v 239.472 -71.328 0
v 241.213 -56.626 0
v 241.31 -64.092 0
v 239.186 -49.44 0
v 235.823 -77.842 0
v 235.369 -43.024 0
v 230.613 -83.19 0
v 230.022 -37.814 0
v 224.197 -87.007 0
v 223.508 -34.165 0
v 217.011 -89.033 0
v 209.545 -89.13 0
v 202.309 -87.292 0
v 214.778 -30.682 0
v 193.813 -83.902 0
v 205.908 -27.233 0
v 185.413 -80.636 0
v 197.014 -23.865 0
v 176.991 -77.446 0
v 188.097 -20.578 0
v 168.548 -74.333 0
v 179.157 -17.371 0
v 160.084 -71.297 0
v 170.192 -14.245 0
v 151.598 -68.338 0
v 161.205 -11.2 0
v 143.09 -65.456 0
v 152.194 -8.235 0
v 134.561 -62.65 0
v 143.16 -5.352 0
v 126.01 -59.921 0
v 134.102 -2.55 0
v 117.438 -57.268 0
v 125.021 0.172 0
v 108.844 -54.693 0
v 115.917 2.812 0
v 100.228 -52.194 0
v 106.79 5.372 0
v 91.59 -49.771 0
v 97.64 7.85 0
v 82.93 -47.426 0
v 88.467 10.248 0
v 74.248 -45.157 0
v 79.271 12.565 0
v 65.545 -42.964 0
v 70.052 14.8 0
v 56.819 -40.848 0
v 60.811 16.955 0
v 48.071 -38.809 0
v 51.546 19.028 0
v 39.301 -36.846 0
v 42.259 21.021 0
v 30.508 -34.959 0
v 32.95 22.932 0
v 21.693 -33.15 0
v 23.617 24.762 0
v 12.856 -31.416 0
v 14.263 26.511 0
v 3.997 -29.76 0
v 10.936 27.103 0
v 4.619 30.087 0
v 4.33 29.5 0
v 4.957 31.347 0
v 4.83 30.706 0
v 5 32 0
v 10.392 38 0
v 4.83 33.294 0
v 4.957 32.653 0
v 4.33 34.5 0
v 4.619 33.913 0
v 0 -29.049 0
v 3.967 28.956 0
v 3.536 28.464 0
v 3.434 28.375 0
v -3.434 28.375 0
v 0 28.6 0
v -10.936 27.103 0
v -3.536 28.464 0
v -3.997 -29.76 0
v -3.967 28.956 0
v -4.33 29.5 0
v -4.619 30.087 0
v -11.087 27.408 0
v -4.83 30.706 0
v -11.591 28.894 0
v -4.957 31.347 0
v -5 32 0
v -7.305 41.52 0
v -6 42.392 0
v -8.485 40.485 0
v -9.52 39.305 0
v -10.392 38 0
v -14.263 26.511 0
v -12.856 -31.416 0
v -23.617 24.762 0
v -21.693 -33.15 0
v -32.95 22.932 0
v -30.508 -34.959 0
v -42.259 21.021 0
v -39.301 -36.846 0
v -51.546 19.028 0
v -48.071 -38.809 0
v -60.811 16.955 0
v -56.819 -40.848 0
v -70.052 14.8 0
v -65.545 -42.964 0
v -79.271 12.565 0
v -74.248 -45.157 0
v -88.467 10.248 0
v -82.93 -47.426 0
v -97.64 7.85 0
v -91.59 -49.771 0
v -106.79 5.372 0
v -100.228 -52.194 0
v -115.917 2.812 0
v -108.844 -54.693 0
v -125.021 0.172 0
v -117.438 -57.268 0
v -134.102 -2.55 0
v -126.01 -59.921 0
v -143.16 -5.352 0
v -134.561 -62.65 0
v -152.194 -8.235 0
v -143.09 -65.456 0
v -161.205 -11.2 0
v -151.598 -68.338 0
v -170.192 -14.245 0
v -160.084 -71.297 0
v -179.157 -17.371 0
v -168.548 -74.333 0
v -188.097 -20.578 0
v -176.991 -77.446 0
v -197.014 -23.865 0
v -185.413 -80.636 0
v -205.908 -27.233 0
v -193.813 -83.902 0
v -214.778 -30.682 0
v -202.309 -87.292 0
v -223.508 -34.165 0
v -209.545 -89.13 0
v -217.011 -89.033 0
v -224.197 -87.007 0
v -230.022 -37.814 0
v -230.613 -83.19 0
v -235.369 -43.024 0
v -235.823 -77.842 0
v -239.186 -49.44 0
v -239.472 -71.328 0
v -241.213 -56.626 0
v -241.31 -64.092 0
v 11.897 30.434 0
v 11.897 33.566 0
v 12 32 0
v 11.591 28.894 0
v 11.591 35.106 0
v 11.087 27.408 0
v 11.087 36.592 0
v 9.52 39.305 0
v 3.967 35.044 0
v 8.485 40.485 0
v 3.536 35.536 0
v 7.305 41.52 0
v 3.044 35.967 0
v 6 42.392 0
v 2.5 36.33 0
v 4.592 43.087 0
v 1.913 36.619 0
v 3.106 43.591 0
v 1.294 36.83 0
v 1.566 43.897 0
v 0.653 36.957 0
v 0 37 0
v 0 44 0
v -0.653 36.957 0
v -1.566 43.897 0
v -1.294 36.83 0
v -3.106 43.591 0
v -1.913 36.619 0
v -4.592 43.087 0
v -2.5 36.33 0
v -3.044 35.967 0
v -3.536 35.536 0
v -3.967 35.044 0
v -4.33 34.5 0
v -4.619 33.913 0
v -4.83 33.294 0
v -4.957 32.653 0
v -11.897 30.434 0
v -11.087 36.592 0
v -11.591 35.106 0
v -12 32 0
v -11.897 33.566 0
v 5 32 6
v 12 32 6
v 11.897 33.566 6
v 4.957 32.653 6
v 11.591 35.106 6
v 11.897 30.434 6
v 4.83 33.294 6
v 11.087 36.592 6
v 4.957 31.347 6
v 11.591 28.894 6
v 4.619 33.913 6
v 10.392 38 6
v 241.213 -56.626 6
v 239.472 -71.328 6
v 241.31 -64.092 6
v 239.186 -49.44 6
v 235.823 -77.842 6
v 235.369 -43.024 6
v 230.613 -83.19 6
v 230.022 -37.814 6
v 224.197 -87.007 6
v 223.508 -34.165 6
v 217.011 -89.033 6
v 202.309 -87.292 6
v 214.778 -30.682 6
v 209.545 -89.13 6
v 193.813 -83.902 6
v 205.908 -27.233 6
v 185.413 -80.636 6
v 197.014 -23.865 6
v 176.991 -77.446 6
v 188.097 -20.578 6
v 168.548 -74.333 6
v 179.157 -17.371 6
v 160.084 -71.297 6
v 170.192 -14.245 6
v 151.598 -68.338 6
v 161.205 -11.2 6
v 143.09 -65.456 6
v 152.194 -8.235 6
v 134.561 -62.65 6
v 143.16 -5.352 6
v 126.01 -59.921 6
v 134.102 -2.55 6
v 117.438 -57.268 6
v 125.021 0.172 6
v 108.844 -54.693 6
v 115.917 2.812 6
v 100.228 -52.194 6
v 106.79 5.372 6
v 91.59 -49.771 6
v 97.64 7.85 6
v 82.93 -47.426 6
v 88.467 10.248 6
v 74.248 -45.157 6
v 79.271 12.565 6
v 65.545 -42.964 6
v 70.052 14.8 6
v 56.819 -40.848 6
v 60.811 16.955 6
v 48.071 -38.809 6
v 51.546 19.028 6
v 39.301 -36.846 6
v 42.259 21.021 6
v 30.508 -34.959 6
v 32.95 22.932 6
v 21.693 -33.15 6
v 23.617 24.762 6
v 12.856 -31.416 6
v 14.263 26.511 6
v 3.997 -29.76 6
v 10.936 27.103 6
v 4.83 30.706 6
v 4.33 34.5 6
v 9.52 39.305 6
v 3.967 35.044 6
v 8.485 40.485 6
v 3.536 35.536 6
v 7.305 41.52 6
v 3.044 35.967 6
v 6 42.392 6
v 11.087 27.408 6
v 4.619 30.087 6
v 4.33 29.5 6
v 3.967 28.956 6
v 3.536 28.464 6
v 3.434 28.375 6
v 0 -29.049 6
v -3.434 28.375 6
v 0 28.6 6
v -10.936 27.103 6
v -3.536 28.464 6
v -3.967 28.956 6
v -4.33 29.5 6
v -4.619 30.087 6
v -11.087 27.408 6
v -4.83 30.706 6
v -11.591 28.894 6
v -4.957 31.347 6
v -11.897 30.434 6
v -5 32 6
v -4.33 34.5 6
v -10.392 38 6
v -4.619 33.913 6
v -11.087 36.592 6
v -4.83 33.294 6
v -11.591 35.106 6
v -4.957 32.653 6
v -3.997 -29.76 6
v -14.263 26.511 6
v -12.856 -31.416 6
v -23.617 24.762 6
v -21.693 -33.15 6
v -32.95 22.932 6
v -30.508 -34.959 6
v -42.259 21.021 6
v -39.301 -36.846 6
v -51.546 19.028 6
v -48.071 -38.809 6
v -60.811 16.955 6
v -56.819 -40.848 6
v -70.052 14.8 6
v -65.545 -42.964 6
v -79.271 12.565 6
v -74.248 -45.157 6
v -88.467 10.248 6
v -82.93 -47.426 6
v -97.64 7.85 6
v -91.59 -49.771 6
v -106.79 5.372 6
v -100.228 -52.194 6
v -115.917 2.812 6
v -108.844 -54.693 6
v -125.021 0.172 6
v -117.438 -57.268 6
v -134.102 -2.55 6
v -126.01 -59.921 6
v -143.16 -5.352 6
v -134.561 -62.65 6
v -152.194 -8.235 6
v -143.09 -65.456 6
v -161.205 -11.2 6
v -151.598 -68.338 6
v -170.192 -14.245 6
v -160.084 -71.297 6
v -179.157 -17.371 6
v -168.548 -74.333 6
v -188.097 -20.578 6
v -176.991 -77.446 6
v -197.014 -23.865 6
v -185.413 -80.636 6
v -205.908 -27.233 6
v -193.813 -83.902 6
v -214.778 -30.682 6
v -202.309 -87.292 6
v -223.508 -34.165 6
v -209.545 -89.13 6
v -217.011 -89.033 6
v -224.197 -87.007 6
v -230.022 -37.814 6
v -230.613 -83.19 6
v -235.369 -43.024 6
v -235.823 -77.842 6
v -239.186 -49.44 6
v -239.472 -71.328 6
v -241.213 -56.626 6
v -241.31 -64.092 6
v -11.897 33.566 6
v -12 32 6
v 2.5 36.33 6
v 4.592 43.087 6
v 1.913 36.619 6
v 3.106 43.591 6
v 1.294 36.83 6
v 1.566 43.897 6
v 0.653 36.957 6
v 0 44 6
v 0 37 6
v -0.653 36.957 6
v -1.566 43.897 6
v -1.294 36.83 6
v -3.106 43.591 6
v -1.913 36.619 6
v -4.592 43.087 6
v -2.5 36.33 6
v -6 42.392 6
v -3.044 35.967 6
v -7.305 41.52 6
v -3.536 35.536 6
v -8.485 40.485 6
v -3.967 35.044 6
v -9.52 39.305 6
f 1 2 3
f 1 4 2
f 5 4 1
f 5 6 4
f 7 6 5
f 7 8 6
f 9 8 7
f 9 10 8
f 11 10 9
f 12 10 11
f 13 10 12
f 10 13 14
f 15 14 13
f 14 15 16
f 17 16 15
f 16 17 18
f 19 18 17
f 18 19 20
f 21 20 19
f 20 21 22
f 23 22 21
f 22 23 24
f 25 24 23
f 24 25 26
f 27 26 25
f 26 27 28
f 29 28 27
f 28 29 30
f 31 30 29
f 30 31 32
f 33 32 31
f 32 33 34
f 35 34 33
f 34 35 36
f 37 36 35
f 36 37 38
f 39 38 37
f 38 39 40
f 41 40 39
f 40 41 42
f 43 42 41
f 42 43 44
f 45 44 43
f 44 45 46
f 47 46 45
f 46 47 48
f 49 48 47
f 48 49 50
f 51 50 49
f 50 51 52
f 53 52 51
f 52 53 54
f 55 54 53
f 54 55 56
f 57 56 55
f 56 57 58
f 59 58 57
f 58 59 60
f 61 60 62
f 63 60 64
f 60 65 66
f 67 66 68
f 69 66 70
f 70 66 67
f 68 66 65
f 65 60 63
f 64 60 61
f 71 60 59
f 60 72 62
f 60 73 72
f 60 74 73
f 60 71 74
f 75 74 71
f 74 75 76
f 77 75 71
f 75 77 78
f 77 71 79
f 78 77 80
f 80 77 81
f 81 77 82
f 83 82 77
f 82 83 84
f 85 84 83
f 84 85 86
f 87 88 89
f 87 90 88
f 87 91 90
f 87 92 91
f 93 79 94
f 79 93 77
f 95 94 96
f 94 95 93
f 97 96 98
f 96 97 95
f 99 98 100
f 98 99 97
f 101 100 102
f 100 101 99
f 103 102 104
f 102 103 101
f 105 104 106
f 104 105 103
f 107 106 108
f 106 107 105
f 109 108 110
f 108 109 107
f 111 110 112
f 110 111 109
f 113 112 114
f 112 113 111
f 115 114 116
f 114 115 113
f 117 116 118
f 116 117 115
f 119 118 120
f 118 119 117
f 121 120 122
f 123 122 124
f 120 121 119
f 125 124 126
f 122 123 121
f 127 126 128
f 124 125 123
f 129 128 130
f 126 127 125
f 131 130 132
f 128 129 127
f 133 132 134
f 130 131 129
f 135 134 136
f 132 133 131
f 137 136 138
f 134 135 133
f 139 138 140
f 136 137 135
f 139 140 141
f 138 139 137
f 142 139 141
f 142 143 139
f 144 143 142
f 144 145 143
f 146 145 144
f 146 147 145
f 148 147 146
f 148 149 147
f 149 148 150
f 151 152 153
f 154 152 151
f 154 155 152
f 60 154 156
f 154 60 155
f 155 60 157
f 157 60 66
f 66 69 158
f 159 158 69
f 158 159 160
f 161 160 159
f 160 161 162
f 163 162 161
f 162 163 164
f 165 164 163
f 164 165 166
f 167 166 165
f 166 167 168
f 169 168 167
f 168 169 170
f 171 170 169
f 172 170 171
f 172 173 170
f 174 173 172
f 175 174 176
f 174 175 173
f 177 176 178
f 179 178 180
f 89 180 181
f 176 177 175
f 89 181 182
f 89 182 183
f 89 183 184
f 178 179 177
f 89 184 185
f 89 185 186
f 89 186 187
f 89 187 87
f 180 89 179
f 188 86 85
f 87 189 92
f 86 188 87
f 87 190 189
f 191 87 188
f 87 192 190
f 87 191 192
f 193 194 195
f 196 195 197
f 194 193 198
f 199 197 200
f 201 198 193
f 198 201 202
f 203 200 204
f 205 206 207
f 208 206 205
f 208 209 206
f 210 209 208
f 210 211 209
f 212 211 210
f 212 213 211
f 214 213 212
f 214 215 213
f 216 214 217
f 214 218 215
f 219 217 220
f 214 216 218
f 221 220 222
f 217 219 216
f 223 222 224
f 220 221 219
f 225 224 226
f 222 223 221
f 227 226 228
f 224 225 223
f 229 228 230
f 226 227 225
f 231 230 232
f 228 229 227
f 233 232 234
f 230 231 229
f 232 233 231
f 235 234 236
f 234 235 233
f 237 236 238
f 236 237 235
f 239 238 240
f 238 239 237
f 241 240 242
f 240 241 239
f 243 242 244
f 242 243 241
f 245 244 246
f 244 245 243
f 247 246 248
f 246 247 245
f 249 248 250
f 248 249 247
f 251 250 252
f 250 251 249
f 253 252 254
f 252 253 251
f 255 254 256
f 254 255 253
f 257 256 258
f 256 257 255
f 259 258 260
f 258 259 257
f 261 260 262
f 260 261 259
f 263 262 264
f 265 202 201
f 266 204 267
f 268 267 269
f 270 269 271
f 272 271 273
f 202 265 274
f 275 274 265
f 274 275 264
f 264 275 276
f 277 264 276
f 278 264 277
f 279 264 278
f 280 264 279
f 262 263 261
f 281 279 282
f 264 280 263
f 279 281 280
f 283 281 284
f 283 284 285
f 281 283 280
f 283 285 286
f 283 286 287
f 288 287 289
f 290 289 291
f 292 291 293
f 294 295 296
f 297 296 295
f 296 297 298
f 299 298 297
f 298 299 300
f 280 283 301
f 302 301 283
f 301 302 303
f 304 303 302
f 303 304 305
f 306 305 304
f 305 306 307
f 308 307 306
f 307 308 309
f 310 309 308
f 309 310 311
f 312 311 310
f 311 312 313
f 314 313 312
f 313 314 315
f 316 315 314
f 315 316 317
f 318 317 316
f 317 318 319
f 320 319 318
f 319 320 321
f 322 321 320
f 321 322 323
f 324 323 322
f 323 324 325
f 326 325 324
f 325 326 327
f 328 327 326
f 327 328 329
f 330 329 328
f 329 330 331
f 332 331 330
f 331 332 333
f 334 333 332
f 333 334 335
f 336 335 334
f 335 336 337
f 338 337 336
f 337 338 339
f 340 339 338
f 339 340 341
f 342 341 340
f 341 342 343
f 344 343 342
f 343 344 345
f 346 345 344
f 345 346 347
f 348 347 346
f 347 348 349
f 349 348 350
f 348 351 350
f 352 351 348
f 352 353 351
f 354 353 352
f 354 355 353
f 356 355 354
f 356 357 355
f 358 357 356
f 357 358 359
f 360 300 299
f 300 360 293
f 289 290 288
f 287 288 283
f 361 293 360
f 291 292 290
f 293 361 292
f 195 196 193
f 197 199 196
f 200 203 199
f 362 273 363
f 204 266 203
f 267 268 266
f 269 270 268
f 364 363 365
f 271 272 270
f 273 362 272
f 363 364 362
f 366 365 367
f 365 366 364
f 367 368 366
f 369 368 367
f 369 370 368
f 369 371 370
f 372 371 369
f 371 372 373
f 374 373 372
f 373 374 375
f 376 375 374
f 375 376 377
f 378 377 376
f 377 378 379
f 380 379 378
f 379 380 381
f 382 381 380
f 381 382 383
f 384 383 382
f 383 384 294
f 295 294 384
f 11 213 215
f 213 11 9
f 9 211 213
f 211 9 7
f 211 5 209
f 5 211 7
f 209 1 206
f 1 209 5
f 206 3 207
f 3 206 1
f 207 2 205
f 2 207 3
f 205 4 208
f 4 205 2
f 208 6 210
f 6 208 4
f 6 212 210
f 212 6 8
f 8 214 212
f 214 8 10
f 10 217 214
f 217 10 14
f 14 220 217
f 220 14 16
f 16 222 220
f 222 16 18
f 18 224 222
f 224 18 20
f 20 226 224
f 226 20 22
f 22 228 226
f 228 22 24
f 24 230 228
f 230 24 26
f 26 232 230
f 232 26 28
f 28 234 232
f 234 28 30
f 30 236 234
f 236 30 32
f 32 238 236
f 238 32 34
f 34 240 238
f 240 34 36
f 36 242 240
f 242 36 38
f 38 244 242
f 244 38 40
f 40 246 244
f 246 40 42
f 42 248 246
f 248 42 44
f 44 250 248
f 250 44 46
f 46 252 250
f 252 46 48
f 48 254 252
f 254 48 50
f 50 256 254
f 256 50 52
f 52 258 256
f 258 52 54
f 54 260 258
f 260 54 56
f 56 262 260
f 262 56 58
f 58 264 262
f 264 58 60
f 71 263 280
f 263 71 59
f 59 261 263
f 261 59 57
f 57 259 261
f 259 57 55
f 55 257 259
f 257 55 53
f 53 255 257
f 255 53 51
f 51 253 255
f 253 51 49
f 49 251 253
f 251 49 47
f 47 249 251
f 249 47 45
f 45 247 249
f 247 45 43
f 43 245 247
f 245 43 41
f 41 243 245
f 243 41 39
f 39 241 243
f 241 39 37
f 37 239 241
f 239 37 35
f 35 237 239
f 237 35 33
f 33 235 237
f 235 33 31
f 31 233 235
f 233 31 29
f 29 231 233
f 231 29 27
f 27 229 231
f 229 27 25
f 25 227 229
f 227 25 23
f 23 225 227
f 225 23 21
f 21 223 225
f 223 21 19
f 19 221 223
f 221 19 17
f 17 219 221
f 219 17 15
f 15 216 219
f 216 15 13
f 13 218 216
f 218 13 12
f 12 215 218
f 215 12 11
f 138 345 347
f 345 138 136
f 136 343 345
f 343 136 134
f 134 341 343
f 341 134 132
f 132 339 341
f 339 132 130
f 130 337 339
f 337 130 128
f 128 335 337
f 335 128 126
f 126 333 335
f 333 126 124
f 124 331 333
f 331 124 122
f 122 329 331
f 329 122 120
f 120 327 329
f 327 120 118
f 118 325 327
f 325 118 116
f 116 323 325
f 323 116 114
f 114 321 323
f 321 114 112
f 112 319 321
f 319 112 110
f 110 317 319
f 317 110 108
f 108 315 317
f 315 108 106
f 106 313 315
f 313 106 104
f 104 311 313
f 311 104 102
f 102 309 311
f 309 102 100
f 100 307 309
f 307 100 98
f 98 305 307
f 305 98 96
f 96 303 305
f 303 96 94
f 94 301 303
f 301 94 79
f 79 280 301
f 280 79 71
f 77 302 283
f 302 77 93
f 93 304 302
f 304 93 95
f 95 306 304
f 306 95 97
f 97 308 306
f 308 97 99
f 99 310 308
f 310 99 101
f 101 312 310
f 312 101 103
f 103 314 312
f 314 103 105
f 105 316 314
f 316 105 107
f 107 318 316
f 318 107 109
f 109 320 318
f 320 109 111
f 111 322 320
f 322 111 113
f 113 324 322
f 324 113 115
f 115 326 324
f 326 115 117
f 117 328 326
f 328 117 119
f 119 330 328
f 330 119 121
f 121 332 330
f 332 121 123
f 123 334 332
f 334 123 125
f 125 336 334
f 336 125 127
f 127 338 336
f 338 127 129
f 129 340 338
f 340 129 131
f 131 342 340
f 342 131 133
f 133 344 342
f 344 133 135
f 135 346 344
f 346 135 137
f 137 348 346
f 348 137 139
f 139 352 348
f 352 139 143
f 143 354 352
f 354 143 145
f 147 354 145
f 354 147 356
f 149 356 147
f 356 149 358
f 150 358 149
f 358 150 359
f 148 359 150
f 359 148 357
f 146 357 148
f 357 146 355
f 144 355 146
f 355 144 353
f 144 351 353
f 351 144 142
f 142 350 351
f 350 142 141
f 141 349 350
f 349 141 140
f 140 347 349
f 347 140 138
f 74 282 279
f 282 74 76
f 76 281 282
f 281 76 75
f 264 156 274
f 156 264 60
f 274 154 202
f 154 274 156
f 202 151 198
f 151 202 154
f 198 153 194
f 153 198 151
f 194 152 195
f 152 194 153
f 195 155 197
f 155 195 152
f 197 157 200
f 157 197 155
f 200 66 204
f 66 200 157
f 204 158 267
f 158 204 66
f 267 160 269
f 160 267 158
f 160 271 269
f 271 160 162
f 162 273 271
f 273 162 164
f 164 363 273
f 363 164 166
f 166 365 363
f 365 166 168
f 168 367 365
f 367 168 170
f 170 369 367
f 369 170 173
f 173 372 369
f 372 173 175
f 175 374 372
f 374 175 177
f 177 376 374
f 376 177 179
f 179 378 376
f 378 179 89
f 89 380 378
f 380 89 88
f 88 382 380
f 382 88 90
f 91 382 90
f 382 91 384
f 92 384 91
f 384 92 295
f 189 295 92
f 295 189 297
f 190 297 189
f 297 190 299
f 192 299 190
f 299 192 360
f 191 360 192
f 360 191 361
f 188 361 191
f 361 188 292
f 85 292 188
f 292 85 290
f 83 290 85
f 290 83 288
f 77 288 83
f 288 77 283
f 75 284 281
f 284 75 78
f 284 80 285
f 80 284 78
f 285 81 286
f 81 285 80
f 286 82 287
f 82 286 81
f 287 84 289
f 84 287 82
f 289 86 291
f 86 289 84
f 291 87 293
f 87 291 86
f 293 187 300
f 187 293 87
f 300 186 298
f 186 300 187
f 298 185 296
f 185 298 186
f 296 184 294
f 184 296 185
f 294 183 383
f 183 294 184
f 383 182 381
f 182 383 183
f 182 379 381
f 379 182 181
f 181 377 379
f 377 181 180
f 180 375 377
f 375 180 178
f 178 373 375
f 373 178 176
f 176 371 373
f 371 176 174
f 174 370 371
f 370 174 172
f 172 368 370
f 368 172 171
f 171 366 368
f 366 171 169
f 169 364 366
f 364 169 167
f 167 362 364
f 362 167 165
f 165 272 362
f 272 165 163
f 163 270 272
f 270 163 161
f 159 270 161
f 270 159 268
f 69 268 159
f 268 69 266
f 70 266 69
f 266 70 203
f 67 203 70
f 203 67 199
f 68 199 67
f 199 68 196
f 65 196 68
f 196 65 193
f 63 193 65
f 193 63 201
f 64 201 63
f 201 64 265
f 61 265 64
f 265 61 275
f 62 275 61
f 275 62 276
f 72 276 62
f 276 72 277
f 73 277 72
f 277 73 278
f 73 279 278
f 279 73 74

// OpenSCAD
// hanger-print: rack w25 w=25 cm slope=15.92 deg bow=0.59 cm r=2.86 cm depth=6.0 mm
// Print flat (layers parallel to the page). Generated by hanger_print.mesh.scad; do not edit by hand.
depth = 6.0;
union() {
  linear_extrude(height = depth) polygon([[5.009, 28.158], [14.263, 26.511], [23.617, 24.762], [32.950, 22.932], [42.259, 21.021], [51.546, 19.028], [60.811, 16.955], [70.052, 14.800], [79.271, 12.565], [88.467, 10.248], [97.640, 7.850], [106.790, 5.372], [115.917, 2.812], [125.021, 0.172], [134.102, -2.550], [143.160, -5.352], [152.194, -8.235], [161.205, -11.200], [170.192, -14.245], [179.157, -17.371], [188.097, -20.578], [197.014, -23.865], [205.908, -27.233], [214.778, -30.682], [223.508, -34.165], [230.022, -37.814], [235.369, -43.024], [239.186, -49.440], [241.213, -56.626], [241.310, -64.092], [239.472, -71.328], [235.823, -77.842], [230.613, -83.190], [224.197, -87.007], [217.011, -89.033], [209.545, -89.130], [202.309, -87.292], [193.813, -83.902], [185.413, -80.636], [176.991, -77.446], [168.548, -74.333], [160.084, -71.297], [151.598, -68.338], [143.090, -65.456], [134.561, -62.650], [126.010, -59.921], [117.438, -57.268], [108.844, -54.693], [100.228, -52.194], [91.590, -49.771], [82.930, -47.426], [74.248, -45.157], [65.545, -42.964], [56.819, -40.848], [48.071, -38.809], [39.301, -36.846], [30.508, -34.959], [21.693, -33.150], [12.856, -31.416], [3.997, -29.760], [-5.009, -28.158]]);
  linear_extrude(height = depth) polygon([[5.009, -28.158], [-3.997, -29.760], [-12.856, -31.416], [-21.693, -33.150], [-30.508, -34.959], [-39.301, -36.846], [-48.071, -38.809], [-56.819, -40.848], [-65.545, -42.964], [-74.248, -45.157], [-82.930, -47.426], [-91.590, -49.771], [-100.228, -52.194], [-108.844, -54.693], [-117.438, -57.268], [-126.010, -59.921], [-134.561, -62.650], [-143.090, -65.456], [-151.598, -68.338], [-160.084, -71.297], [-168.548, -74.333], [-176.991, -77.446], [-185.413, -80.636], [-193.813, -83.902], [-202.309, -87.292], [-209.545, -89.130], [-217.011, -89.033], [-224.197, -87.007], [-230.613, -83.190], [-235.823, -77.842], [-239.472, -71.328], [-241.310, -64.092], [-241.213, -56.626], [-239.186, -49.440], [-235.369, -43.024], [-230.022, -37.814], [-223.508, -34.165], [-214.778, -30.682], [-205.908, -27.233], [-197.014, -23.865], [-188.097, -20.578], [-179.157, -17.371], [-170.192, -14.245], [-161.205, -11.200], [-152.194, -8.235], [-143.160, -5.352], [-134.102, -2.550], [-125.021, 0.172], [-115.917, 2.812], [-106.790, 5.372], [-97.640, 7.850], [-88.467, 10.248], [-79.271, 12.565], [-70.052, 14.800], [-60.811, 16.955], [-51.546, 19.028], [-42.259, 21.021], [-32.950, 22.932], [-23.617, 24.762], [-14.263, 26.511], [-5.009, 28.158]]);
  linear_extrude(height = depth) polygon([[28.600, 0.000], [28.355, 3.733], [27.625, 7.402], [26.423, 10.945], [24.768, 14.300], [22.690, 17.411], [20.223, 20.223], [17.411, 22.690], [14.300, 24.768], [10.945, 26.423], [7.402, 27.625], [3.733, 28.355], [0.000, 28.600], [-3.733, 28.355], [-7.402, 27.625], [-10.945, 26.423], [-14.300, 24.768], [-17.411, 22.690], [-20.223, 20.223], [-22.690, 17.411], [-24.768, 14.300], [-26.423, 10.945], [-27.625, 7.402], [-28.355, 3.733], [-28.600, 0.000], [-28.355, -3.733], [-27.625, -7.402], [-26.423, -10.945], [-24.768, -14.300], [-22.690, -17.411], [-20.223, -20.223], [-17.411, -22.690], [-14.300, -24.768], [-10.945, -26.423], [-7.402, -27.625], [-3.733, -28.355], [-0.000, -28.600], [3.733, -28.355], [7.402, -27.625], [10.945, -26.423], [14.300, -24.768], [17.411, -22.690], [20.223, -20.223], [22.690, -17.411], [24.768, -14.300], [26.423, -10.945], [27.625, -7.402], [28.355, -3.733]]);
  linear_extrude(height = depth) polygon([[-7.000, 0.000], [7.000, 0.000], [7.000, 27.000], [-7.000, 27.000]]);
  linear_extrude(height = depth) difference() { polygon([[12.000, 32.000], [11.897, 33.566], [11.591, 35.106], [11.087, 36.592], [10.392, 38.000], [9.520, 39.305], [8.485, 40.485], [7.305, 41.520], [6.000, 42.392], [4.592, 43.087], [3.106, 43.591], [1.566, 43.897], [0.000, 44.000], [-1.566, 43.897], [-3.106, 43.591], [-4.592, 43.087], [-6.000, 42.392], [-7.305, 41.520], [-8.485, 40.485], [-9.520, 39.305], [-10.392, 38.000], [-11.087, 36.592], [-11.591, 35.106], [-11.897, 33.566], [-12.000, 32.000], [-11.897, 30.434], [-11.591, 28.894], [-11.087, 27.408], [-10.392, 26.000], [-9.520, 24.695], [-8.485, 23.515], [-7.305, 22.480], [-6.000, 21.608], [-4.592, 20.913], [-3.106, 20.409], [-1.566, 20.103], [-0.000, 20.000], [1.566, 20.103], [3.106, 20.409], [4.592, 20.913], [6.000, 21.608], [7.305, 22.480], [8.485, 23.515], [9.520, 24.695], [10.392, 26.000], [11.087, 27.408], [11.591, 28.894], [11.897, 30.434]]); polygon([[5.000, 32.000], [4.957, 32.653], [4.830, 33.294], [4.619, 33.913], [4.330, 34.500], [3.967, 35.044], [3.536, 35.536], [3.044, 35.967], [2.500, 36.330], [1.913, 36.619], [1.294, 36.830], [0.653, 36.957], [0.000, 37.000], [-0.653, 36.957], [-1.294, 36.830], [-1.913, 36.619], [-2.500, 36.330], [-3.044, 35.967], [-3.536, 35.536], [-3.967, 35.044], [-4.330, 34.500], [-4.619, 33.913], [-4.830, 33.294], [-4.957, 32.653], [-5.000, 32.000], [-4.957, 31.347], [-4.830, 30.706], [-4.619, 30.087], [-4.330, 29.500], [-3.967, 28.956], [-3.536, 28.464], [-3.044, 28.033], [-2.500, 27.670], [-1.913, 27.381], [-1.294, 27.170], [-0.653, 27.043], [-0.000, 27.000], [0.653, 27.043], [1.294, 27.170], [1.913, 27.381], [2.500, 27.670], [3.044, 28.033], [3.536, 28.464], [3.967, 28.956], [4.330, 29.500], [4.619, 30.087], [4.830, 30.706], [4.957, 31.347]]); }
}
